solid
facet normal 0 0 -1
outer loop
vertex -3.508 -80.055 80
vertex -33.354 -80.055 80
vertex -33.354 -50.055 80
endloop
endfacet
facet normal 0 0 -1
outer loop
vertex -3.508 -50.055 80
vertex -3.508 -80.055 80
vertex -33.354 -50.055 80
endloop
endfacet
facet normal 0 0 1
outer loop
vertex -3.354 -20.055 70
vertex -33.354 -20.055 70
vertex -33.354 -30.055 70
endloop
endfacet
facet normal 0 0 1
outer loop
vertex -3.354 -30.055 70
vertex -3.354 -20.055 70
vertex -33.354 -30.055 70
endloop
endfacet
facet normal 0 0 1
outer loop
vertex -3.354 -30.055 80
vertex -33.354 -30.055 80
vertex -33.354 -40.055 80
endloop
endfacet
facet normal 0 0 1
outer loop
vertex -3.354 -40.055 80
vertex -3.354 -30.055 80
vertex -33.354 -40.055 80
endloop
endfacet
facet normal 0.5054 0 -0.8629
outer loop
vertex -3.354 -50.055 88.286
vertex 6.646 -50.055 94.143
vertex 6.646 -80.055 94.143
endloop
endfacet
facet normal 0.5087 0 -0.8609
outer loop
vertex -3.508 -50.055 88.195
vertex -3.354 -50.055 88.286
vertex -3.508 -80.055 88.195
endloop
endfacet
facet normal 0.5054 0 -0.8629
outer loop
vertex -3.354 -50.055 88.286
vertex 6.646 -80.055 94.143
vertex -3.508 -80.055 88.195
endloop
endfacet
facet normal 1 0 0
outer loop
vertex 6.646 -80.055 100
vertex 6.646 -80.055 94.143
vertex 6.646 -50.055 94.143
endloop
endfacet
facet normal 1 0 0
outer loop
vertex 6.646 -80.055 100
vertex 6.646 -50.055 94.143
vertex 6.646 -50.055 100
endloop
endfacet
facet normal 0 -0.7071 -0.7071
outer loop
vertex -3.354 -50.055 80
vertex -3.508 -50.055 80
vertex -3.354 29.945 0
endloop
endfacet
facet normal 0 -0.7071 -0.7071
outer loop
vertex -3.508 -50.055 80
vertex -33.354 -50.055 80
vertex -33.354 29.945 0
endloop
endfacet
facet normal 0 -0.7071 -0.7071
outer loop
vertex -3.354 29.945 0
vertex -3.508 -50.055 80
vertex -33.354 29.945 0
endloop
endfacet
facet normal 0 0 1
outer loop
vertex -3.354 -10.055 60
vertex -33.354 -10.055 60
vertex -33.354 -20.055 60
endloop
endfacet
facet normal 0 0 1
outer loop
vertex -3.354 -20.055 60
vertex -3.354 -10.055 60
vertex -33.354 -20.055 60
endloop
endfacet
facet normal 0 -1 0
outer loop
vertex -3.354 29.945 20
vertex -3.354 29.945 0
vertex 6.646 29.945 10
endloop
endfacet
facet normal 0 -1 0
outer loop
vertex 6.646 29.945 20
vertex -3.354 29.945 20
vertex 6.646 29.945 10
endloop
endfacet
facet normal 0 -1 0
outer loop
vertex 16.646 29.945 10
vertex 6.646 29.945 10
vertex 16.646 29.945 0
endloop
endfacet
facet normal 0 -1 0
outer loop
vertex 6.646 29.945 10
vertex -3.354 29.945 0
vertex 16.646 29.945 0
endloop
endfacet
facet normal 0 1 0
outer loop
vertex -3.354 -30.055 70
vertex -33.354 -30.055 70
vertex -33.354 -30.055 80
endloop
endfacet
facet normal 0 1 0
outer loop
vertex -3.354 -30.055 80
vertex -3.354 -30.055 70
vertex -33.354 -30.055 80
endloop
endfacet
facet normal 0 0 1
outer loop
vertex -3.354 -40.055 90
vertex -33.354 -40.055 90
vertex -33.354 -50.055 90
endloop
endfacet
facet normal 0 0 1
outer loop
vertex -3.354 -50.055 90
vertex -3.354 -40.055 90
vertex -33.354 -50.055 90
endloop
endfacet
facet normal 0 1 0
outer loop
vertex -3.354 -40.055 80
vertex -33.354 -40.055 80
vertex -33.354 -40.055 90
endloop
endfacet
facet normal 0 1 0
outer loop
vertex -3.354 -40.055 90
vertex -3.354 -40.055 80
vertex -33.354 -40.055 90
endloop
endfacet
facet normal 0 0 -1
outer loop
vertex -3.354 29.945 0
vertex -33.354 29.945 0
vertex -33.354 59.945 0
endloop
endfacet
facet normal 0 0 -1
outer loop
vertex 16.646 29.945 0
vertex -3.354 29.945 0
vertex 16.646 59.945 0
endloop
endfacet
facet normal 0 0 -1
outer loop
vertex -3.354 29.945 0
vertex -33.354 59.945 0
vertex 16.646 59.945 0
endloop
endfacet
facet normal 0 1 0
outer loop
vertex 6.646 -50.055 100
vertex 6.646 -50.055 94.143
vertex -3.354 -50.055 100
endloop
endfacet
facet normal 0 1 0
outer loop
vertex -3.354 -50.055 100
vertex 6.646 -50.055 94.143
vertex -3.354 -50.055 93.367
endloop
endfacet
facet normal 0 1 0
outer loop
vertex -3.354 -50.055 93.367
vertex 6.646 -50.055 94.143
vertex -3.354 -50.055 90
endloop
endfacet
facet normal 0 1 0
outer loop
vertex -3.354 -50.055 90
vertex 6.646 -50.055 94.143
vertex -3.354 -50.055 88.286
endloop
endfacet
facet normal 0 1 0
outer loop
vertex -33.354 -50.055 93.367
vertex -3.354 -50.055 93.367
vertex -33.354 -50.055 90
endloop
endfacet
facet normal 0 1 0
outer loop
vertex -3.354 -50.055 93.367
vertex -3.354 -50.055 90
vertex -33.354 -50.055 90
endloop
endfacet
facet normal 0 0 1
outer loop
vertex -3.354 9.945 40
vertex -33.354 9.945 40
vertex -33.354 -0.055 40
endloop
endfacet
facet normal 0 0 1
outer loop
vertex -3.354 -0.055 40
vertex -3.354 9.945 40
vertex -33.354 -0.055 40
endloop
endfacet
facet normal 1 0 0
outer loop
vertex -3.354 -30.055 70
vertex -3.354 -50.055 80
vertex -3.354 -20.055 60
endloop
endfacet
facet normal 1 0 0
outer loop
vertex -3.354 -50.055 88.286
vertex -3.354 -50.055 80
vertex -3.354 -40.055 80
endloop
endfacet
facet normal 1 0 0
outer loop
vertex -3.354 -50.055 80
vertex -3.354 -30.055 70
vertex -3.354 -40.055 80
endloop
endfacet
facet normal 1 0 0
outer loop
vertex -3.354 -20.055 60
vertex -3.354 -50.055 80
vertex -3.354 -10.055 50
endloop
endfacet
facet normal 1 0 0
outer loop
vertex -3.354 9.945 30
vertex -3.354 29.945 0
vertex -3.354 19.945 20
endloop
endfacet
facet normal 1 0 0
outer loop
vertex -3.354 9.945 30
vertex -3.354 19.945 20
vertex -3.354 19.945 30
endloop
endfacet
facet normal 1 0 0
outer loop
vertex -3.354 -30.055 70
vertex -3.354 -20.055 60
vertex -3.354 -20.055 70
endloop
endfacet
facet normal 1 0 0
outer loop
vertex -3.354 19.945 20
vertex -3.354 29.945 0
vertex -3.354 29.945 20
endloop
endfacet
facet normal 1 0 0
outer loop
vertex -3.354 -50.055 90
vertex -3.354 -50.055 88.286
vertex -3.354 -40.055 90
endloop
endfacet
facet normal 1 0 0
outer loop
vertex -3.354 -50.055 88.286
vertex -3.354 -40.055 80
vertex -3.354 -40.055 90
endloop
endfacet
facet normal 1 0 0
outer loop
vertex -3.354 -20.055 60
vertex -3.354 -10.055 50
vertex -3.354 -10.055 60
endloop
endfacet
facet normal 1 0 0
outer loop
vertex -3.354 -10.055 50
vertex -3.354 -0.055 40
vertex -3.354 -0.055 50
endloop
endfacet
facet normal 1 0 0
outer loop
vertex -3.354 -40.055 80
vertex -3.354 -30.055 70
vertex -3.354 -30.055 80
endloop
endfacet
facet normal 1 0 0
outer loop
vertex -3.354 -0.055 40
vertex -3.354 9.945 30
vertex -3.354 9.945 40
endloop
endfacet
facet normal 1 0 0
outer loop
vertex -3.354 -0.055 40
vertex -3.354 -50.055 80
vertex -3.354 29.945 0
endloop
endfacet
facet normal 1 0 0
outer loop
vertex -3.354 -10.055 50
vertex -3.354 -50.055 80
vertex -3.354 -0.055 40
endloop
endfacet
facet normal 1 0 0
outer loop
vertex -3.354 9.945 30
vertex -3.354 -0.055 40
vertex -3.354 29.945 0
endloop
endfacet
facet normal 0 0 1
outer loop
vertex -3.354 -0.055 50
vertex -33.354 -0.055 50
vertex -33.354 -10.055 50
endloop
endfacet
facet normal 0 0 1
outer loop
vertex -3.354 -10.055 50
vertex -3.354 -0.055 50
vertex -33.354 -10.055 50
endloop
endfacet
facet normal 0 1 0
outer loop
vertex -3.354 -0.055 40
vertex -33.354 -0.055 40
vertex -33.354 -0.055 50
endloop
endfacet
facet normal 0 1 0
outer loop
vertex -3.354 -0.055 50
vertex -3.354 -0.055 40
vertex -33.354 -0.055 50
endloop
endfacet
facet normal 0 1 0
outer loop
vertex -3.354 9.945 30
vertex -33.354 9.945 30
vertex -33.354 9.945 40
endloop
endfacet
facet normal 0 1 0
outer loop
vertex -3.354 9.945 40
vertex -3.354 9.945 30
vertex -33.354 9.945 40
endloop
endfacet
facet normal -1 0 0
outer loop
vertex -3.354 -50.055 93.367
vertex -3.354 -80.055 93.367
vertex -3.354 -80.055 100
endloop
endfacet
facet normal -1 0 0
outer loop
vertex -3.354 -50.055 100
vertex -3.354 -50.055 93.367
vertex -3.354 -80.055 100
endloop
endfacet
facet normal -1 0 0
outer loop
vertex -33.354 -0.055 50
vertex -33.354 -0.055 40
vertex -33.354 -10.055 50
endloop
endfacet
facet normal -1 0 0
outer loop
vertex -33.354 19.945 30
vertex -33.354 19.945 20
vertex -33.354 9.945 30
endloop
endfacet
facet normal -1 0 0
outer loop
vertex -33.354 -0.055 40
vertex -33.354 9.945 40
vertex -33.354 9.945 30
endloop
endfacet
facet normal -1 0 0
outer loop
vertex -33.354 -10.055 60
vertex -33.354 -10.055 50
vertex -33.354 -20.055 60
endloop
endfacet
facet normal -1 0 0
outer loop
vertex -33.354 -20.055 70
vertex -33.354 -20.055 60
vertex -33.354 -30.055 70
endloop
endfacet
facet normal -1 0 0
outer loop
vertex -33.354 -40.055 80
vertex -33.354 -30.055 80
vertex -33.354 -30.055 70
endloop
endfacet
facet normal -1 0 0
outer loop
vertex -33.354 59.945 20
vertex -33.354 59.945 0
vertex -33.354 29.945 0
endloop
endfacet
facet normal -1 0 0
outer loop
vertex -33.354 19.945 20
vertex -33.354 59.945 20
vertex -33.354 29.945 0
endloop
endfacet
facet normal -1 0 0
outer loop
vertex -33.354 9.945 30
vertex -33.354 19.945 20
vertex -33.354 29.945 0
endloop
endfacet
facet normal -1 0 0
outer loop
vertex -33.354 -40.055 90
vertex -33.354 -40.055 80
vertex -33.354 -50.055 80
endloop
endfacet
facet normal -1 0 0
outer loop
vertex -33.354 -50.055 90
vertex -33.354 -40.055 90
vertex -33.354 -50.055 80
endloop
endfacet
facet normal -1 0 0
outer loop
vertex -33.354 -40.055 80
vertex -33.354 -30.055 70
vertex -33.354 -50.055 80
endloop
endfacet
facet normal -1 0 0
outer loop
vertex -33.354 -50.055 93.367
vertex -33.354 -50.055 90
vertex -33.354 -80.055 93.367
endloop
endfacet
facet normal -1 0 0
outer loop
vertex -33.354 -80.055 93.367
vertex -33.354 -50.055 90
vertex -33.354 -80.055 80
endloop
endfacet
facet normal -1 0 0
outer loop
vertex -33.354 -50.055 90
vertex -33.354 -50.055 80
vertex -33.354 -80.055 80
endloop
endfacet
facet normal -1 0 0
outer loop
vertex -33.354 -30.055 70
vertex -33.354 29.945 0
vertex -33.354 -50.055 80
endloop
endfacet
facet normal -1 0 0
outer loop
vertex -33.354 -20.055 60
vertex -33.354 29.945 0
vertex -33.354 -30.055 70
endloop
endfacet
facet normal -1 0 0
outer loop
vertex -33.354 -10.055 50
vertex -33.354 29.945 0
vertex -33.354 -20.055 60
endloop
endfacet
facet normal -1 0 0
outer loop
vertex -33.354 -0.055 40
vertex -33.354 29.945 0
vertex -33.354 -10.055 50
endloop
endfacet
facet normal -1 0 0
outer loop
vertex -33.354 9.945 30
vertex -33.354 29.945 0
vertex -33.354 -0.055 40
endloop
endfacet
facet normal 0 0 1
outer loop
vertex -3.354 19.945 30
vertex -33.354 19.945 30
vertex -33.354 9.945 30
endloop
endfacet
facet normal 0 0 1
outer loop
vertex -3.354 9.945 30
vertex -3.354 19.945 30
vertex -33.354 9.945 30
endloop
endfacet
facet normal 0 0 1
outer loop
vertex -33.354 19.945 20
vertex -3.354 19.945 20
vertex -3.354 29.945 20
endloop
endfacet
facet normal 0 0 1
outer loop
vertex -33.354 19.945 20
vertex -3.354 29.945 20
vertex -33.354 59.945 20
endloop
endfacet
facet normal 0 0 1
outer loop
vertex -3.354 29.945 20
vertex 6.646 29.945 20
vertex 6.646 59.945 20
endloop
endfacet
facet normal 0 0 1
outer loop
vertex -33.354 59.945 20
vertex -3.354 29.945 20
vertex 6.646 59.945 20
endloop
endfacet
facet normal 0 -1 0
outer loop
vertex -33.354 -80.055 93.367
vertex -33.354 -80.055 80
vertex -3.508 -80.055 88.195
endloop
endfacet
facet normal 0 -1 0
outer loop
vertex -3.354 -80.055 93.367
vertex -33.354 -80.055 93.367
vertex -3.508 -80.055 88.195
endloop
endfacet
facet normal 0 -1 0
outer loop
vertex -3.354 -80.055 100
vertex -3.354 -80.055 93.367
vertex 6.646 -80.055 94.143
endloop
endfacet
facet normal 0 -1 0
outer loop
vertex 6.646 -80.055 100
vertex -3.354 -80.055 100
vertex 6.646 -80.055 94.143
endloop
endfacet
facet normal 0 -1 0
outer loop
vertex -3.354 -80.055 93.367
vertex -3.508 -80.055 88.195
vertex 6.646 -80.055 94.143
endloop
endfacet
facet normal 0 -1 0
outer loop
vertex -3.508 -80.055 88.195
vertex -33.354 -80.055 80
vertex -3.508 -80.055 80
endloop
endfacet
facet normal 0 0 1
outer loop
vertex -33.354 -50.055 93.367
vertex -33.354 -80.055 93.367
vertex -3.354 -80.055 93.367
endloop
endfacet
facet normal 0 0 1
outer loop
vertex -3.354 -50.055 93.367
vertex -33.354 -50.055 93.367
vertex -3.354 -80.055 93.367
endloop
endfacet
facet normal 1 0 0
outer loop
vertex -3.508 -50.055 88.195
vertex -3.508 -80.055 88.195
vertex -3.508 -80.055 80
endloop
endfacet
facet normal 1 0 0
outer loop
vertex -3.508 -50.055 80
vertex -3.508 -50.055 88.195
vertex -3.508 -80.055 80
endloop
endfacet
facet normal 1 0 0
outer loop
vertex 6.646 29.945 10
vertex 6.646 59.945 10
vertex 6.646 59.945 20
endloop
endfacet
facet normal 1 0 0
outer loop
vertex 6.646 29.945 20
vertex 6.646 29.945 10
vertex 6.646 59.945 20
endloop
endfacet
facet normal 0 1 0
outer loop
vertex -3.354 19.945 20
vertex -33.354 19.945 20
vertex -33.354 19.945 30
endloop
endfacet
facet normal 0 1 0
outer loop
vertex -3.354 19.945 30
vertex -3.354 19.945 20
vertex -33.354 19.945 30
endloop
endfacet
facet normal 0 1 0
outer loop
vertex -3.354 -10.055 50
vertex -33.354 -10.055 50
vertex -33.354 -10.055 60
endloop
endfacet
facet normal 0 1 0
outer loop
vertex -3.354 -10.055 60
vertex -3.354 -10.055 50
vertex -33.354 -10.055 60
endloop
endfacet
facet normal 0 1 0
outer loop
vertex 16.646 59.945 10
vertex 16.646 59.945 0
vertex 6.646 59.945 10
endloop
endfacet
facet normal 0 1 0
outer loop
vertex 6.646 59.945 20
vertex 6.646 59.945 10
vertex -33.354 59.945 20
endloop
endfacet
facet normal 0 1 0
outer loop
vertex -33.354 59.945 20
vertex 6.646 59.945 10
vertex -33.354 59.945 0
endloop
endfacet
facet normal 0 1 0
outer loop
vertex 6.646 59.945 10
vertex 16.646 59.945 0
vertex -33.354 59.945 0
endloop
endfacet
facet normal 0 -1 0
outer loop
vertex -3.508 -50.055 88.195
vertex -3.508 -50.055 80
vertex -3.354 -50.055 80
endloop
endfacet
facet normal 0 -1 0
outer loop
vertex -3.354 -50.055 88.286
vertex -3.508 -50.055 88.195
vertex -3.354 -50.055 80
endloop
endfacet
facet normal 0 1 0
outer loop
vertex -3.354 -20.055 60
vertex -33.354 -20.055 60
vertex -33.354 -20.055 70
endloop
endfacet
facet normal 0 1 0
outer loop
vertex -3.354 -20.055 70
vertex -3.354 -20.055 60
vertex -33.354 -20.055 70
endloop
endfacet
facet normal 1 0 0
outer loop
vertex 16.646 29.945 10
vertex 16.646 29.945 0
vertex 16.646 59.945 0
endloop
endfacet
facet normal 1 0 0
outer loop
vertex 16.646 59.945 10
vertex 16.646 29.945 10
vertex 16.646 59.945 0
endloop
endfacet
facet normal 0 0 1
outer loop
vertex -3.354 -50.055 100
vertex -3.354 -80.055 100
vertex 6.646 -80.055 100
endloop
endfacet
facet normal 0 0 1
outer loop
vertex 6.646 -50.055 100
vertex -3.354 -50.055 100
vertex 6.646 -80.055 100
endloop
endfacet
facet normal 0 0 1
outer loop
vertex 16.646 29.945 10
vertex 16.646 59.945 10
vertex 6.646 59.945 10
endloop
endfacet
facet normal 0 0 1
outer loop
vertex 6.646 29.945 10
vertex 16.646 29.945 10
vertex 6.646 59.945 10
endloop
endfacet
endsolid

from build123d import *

# Parameters (mm, degrees)
F1_DEPTH  = 120
F2_W      = 10
F2_H      = 10
F3_DEPTH  = 30
F5_DEPTH  = 30
F6_W      = 30
F6_H      = 100
F7_DEPTH  = 30
F9_DEPTH  = 60
F10_W     = 10
F10_H     = 10
F11_DEPTH = 30
F12_W     = 10
F12_H     = 10
F13_DEPTH = 30
F15_DEPTH = 30
F16_W     = 10
F16_H     = 23.5784614086
F17_DEPTH = 30


with BuildPart() as f1:
    # F0 (on Top) → F1 (new body)
    with BuildSketch(Plane.XY):
        Polygon((16.6459785789, 59.9448081851), (-33.3540214211, 59.9448081851), (-33.3540214211, 29.9448081851), (-33.3540214211, -50.0551918149), (-33.3540214211, -80.0551918149), (16.6459785789, -80.0551918149), (16.6459785789, -50.0551918149), (-3.3540214211, -50.0551918149), (-3.3540214211, 29.9448081851), (16.6459785789, 29.9448081851), align=None)
    extrude(amount=F1_DEPTH)

    # F2 (on face) → F3 (cut)
    with BuildSketch(Plane(origin=(0, 59.9448081851, 0), x_dir=(-1, 0, 0), z_dir=(0, 1, 0))):
        with Locations((-11.6459785789, 15)):
            Rectangle(F2_W, F2_H)
        with Locations((-1.6459785789, 25)):
            Rectangle(F2_W, F2_H)
        Polygon((-16.6459785789, 120), (-16.6459785789, 20), (-6.6459785789, 20), (-6.6459785789, 30), (3.3540214211, 30), (3.3540214211, 120), align=None)
    extrude(amount=-F3_DEPTH, mode=Mode.SUBTRACT)

    # F4 (on face) → F5 (cut)
    with BuildSketch(Plane.YZ.offset(-3.3540214211)):
        Polygon((-50.0551918149, 100), (29.9448081851, 20), (29.9448081851, 120), (-50.0551918149, 120), align=None)
    extrude(amount=-F5_DEPTH, mode=Mode.SUBTRACT)

    # F6 (on face) → F7 (cut)
    with BuildSketch(Plane.YZ.offset(-3.3540214211)):
        with Locations((44.9448081851, 70)):
            Rectangle(F6_W, F6_H)
    extrude(amount=-F7_DEPTH, mode=Mode.SUBTRACT)

    # F8 (on face) → F9 (cut)
    with BuildSketch(Plane(origin=(-33.3540214211, 0, 0), x_dir=(0, -1, 0), z_dir=(-1, 0, 0))):
        Polygon((50.0551918149, 80), (-29.9448081851, 0), (80.0551918149, 0), (80.0551918149, 80), align=None)
    extrude(amount=-F9_DEPTH, mode=Mode.SUBTRACT)

    # F10 (on face) → F11 (cut)
    with BuildSketch(Plane(origin=(-33.3540214211, 0, 0), x_dir=(0, -1, 0), z_dir=(-1, 0, 0))):
        with Locations((-24.9448081851, 25)):
            Rectangle(F10_W, F10_H)
        with Locations((45.0551918149, 95)):
            Rectangle(F10_W, F10_H)
        with Locations((35.0551918149, 85)):
            Rectangle(F10_W, F10_H)
        with Locations((25.0551918149, 75)):
            Rectangle(F10_W, F10_H)
        with Locations((15.0551918149, 65)):
            Rectangle(F10_W, F10_H)
        with Locations((5.0551918149, 55)):
            Rectangle(F10_W, F10_H)
        with Locations((-4.9448081851, 45)):
            Rectangle(F10_W, F10_H)
        with Locations((-14.9448081851, 35)):
            Rectangle(F10_W, F10_H)
    extrude(amount=-F11_DEPTH, mode=Mode.SUBTRACT)

    # F12 (on face) → F13 (cut)
    with BuildSketch(Plane.XZ.offset(80.0551918149)):
        with Locations((11.6459785789, 115)):
            Rectangle(F12_W, F12_H)
        with Locations((1.6459785789, 105)):
            Rectangle(F12_W, F12_H)
        Polygon((16.6459785789, 80), (16.6459785789, 100), (-3.5083531402, 88.195104599), (-3.5083531402, 80), align=None)
        with Locations((1.6459785789, 115)):
            Rectangle(F12_W, F12_H)
    extrude(amount=-F13_DEPTH, mode=Mode.SUBTRACT)

    # F14 (on face) → F15 (cut)
    with BuildSketch(Plane.XZ.offset(80.0551918149)):
        Polygon((-3.3540214211, 120), (-3.5083531402, 120), (-33.3540214211, 120), (-33.3540214211, 93.3674471554), (-3.3540214211, 93.3674471554), (-3.3540214211, 100), align=None)
    extrude(amount=-F15_DEPTH, mode=Mode.SUBTRACT)

    # F16 (on face) → F17 (cut)
    with BuildSketch(Plane.XZ.offset(80.0551918149)):
        with Locations((11.6459785789, 98.2107692957)):
            Rectangle(F16_W, F16_H)
    extrude(amount=-F17_DEPTH, mode=Mode.SUBTRACT)


solid = f1.part
